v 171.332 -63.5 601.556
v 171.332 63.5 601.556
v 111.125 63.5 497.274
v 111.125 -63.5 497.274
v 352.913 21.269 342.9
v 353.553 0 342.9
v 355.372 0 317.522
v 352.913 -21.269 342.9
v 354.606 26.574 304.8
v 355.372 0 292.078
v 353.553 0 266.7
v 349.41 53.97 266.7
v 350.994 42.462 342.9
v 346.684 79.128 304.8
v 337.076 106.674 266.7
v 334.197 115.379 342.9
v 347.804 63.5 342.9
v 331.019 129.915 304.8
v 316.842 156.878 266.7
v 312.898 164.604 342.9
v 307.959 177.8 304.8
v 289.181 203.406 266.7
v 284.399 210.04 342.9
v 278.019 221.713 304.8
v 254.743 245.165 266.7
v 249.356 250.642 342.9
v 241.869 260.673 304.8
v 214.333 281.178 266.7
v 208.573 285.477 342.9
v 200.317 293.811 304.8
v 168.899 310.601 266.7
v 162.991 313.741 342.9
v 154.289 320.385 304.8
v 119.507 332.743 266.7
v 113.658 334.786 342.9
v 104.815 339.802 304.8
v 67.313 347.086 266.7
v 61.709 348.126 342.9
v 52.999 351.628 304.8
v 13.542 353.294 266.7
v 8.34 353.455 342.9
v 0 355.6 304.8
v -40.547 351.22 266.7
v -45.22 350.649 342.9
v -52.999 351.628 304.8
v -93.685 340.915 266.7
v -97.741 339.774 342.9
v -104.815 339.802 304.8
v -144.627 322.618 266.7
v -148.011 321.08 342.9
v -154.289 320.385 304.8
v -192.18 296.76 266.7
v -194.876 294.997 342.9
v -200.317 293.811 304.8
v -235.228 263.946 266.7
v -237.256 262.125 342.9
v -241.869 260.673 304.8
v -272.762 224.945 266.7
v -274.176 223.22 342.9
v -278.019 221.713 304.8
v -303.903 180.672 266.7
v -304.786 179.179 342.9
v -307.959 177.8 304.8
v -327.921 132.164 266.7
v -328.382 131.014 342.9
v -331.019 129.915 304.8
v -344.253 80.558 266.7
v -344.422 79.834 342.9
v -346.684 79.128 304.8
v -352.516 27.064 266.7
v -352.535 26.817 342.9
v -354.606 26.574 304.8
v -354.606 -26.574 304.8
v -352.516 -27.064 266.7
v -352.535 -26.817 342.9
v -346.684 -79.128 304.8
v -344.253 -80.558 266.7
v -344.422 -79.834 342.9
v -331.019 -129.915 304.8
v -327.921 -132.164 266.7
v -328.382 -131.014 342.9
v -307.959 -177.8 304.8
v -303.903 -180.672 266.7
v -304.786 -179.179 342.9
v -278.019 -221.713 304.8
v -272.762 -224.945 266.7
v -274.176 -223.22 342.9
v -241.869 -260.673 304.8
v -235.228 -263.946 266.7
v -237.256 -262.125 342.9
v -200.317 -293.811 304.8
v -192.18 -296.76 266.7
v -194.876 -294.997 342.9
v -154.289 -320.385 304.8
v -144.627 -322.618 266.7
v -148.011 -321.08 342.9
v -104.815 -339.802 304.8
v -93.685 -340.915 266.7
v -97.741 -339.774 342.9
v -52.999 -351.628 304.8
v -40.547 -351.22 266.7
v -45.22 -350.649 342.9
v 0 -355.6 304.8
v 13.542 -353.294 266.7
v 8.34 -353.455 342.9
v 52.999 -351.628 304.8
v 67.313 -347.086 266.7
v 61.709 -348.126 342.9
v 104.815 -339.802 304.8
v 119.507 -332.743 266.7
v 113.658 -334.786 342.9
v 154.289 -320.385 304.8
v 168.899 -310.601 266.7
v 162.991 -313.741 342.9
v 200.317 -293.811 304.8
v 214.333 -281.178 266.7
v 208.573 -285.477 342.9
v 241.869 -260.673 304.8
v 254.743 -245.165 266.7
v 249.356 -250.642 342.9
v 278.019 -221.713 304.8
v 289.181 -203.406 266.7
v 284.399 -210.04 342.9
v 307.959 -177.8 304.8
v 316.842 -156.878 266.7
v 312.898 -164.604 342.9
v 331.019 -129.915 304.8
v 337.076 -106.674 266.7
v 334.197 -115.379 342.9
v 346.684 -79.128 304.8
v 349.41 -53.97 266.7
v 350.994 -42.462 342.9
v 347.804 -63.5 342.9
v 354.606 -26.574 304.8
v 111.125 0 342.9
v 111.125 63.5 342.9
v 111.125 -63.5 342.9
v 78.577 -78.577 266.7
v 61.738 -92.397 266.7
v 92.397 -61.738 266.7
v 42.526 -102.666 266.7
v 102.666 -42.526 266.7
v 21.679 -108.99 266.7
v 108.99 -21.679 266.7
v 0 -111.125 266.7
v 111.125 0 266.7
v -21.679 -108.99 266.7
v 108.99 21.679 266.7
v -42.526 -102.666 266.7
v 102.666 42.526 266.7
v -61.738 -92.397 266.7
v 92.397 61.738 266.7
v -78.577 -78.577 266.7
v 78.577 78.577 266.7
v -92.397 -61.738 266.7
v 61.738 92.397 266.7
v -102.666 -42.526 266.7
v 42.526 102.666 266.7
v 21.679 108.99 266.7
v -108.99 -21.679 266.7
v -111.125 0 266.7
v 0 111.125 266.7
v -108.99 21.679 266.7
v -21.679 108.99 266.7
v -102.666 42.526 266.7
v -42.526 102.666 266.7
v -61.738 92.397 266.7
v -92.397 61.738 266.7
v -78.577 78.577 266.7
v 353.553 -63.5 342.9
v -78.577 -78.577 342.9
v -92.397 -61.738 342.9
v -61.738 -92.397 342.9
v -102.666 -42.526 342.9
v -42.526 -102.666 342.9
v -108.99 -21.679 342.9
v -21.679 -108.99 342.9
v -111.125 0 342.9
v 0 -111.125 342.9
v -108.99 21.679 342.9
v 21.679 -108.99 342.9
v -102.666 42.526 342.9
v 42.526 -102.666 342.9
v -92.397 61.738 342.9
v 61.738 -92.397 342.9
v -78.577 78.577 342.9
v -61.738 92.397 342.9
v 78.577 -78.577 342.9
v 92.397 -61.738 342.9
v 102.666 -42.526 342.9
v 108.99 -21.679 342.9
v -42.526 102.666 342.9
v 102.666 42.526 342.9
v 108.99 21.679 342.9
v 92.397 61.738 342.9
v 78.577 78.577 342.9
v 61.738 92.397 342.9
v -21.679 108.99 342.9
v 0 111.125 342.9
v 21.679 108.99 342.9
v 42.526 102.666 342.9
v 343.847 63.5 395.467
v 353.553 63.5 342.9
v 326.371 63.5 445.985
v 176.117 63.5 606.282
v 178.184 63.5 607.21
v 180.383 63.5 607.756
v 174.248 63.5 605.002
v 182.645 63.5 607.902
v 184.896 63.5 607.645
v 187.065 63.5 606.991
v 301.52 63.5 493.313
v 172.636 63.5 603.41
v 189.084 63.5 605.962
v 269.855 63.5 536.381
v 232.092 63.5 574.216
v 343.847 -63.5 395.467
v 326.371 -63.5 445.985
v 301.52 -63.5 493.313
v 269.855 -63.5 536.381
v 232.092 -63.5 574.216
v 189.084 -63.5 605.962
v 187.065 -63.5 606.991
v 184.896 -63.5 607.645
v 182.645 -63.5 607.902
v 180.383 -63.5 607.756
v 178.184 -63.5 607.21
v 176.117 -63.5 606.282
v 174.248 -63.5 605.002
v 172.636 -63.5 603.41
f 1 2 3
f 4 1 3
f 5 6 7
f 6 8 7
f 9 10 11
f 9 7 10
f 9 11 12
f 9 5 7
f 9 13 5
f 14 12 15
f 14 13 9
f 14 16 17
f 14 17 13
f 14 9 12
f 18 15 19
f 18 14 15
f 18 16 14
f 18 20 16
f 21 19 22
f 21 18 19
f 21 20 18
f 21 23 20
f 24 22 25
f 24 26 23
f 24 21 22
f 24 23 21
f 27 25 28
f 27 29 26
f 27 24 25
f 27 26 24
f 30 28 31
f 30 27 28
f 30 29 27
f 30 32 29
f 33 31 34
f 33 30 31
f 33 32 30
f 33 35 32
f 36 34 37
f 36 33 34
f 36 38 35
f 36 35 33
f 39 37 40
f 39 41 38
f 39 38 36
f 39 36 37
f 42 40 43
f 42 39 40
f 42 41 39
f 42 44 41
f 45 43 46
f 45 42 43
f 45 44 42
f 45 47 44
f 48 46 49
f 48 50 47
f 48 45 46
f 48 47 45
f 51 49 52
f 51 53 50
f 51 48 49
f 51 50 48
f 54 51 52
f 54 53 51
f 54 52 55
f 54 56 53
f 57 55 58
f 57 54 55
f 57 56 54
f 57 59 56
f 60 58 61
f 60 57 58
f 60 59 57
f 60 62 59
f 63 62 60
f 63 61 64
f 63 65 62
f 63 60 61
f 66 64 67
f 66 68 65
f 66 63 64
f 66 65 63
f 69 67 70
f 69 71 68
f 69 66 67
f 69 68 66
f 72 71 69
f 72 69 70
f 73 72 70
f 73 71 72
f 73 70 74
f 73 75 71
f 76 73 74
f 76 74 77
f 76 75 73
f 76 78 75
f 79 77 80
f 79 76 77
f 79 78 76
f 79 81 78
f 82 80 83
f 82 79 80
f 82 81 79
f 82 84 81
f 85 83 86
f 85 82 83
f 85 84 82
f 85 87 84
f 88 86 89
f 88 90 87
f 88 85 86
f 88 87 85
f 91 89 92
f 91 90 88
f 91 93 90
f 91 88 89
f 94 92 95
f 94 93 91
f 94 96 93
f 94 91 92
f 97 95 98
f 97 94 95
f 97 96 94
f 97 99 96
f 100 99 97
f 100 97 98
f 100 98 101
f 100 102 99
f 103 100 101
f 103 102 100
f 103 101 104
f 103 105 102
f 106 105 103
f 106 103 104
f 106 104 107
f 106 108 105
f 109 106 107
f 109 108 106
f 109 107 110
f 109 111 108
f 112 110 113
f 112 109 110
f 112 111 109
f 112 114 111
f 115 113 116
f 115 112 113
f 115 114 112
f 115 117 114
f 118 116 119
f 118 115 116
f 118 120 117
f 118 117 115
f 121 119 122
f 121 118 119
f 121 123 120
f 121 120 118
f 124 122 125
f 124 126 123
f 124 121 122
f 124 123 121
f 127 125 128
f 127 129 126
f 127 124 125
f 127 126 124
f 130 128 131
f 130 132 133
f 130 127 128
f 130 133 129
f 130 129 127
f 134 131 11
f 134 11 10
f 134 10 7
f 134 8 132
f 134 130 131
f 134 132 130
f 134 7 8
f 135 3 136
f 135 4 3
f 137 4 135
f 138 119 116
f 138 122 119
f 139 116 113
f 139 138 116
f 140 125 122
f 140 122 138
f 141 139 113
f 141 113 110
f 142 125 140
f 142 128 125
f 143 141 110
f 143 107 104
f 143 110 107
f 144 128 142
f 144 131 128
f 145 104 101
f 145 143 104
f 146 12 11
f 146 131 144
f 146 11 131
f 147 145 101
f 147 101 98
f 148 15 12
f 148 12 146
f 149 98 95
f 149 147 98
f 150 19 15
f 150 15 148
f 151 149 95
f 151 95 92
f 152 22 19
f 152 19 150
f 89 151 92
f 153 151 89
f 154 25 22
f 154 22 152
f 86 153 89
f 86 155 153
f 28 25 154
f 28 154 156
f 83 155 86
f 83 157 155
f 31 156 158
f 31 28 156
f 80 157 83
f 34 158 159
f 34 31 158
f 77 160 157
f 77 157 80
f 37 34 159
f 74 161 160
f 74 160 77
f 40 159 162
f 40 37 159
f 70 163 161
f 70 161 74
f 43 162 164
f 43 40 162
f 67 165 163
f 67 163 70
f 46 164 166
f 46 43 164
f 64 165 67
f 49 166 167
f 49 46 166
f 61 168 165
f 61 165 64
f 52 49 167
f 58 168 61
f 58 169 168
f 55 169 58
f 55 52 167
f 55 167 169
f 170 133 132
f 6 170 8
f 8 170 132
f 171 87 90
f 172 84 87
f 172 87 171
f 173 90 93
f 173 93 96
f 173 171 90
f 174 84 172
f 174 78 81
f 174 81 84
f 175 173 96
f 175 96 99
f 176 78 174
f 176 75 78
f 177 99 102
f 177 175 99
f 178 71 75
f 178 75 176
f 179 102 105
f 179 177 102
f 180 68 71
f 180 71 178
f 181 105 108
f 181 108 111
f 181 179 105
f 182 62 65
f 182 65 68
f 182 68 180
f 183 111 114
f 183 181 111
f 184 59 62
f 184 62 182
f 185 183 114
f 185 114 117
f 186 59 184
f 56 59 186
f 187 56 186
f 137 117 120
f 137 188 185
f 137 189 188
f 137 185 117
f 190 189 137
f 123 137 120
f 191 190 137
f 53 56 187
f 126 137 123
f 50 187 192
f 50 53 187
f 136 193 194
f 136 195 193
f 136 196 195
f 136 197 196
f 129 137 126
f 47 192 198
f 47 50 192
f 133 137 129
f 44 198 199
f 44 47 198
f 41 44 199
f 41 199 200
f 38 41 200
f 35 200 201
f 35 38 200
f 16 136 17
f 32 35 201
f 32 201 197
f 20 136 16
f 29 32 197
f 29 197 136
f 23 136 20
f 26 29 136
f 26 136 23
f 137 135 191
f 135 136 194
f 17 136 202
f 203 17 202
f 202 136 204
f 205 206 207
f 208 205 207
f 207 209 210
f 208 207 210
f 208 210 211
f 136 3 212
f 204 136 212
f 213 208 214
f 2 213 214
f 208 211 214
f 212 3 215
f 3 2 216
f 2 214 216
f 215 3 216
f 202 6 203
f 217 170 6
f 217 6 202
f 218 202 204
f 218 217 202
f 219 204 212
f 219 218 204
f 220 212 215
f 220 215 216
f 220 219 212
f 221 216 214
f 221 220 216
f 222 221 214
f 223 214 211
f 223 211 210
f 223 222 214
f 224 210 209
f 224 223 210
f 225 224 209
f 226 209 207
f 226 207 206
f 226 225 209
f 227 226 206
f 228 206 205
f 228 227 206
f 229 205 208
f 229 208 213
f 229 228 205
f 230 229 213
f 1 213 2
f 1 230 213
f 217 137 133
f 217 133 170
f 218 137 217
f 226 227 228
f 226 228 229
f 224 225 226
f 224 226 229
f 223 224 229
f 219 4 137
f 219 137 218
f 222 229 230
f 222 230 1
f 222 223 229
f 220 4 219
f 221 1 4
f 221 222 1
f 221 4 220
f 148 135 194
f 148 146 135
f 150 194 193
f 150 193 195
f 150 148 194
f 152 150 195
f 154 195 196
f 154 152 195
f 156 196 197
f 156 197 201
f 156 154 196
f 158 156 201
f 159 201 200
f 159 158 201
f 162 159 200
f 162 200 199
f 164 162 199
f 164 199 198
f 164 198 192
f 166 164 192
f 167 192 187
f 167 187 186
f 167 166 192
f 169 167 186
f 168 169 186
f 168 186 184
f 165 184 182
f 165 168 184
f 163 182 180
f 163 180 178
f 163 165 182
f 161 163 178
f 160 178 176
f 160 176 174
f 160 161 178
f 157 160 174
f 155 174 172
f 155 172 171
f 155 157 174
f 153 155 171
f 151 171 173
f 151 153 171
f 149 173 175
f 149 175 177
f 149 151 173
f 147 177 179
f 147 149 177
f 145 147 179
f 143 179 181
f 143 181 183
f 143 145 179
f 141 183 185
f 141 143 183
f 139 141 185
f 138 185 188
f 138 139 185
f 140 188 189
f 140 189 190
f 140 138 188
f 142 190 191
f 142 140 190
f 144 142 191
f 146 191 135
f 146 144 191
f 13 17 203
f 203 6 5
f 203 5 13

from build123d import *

# Parameters (mm, degrees)
F2_DEPTH = 63.5


# Not quite as in the source:
# - a feature names something its author has since deleted; it is built from what else it names


with BuildPart() as f1:
    # F0 (on Front) → F1 (revolve)
    with BuildSketch(Plane.XZ):
        with BuildLine():
            Line((353.5530370397, 342.9), (111.125, 342.9))
            Line((111.125, 342.9), (111.125, 266.7))
            Line((111.125, 266.7), (353.5530370397, 266.7))
            ThreePointArc((353.5530370397, 266.7), (355.6, 304.8), (353.5530370397, 342.9))
        make_face()
    revolve(axis=Axis((0, 0, 509.3539357185), (0, 0, 1)))

    # F0 (on Front) → F2 (join, symmetric)
    with BuildSketch(Plane.XZ):
        with BuildLine():
            Line((111.125, 497.2741459911), (111.125, 342.9))
            Line((111.125, 342.9), (353.5530370397, 342.9))
            ThreePointArc((353.5530370397, 342.9), (301.5197040525, 493.3132039623), (189.0838855952, 605.9621560027))
            ThreePointArc((189.0838855952, 605.9621560027), (179.2716620853, 607.5323992178), (171.332367053, 601.5563647169))
            Line((171.332367053, 601.5563647169), (111.125, 497.2741459911))
        make_face()
    extrude(amount=F2_DEPTH, both=True)


solid = f1.part
